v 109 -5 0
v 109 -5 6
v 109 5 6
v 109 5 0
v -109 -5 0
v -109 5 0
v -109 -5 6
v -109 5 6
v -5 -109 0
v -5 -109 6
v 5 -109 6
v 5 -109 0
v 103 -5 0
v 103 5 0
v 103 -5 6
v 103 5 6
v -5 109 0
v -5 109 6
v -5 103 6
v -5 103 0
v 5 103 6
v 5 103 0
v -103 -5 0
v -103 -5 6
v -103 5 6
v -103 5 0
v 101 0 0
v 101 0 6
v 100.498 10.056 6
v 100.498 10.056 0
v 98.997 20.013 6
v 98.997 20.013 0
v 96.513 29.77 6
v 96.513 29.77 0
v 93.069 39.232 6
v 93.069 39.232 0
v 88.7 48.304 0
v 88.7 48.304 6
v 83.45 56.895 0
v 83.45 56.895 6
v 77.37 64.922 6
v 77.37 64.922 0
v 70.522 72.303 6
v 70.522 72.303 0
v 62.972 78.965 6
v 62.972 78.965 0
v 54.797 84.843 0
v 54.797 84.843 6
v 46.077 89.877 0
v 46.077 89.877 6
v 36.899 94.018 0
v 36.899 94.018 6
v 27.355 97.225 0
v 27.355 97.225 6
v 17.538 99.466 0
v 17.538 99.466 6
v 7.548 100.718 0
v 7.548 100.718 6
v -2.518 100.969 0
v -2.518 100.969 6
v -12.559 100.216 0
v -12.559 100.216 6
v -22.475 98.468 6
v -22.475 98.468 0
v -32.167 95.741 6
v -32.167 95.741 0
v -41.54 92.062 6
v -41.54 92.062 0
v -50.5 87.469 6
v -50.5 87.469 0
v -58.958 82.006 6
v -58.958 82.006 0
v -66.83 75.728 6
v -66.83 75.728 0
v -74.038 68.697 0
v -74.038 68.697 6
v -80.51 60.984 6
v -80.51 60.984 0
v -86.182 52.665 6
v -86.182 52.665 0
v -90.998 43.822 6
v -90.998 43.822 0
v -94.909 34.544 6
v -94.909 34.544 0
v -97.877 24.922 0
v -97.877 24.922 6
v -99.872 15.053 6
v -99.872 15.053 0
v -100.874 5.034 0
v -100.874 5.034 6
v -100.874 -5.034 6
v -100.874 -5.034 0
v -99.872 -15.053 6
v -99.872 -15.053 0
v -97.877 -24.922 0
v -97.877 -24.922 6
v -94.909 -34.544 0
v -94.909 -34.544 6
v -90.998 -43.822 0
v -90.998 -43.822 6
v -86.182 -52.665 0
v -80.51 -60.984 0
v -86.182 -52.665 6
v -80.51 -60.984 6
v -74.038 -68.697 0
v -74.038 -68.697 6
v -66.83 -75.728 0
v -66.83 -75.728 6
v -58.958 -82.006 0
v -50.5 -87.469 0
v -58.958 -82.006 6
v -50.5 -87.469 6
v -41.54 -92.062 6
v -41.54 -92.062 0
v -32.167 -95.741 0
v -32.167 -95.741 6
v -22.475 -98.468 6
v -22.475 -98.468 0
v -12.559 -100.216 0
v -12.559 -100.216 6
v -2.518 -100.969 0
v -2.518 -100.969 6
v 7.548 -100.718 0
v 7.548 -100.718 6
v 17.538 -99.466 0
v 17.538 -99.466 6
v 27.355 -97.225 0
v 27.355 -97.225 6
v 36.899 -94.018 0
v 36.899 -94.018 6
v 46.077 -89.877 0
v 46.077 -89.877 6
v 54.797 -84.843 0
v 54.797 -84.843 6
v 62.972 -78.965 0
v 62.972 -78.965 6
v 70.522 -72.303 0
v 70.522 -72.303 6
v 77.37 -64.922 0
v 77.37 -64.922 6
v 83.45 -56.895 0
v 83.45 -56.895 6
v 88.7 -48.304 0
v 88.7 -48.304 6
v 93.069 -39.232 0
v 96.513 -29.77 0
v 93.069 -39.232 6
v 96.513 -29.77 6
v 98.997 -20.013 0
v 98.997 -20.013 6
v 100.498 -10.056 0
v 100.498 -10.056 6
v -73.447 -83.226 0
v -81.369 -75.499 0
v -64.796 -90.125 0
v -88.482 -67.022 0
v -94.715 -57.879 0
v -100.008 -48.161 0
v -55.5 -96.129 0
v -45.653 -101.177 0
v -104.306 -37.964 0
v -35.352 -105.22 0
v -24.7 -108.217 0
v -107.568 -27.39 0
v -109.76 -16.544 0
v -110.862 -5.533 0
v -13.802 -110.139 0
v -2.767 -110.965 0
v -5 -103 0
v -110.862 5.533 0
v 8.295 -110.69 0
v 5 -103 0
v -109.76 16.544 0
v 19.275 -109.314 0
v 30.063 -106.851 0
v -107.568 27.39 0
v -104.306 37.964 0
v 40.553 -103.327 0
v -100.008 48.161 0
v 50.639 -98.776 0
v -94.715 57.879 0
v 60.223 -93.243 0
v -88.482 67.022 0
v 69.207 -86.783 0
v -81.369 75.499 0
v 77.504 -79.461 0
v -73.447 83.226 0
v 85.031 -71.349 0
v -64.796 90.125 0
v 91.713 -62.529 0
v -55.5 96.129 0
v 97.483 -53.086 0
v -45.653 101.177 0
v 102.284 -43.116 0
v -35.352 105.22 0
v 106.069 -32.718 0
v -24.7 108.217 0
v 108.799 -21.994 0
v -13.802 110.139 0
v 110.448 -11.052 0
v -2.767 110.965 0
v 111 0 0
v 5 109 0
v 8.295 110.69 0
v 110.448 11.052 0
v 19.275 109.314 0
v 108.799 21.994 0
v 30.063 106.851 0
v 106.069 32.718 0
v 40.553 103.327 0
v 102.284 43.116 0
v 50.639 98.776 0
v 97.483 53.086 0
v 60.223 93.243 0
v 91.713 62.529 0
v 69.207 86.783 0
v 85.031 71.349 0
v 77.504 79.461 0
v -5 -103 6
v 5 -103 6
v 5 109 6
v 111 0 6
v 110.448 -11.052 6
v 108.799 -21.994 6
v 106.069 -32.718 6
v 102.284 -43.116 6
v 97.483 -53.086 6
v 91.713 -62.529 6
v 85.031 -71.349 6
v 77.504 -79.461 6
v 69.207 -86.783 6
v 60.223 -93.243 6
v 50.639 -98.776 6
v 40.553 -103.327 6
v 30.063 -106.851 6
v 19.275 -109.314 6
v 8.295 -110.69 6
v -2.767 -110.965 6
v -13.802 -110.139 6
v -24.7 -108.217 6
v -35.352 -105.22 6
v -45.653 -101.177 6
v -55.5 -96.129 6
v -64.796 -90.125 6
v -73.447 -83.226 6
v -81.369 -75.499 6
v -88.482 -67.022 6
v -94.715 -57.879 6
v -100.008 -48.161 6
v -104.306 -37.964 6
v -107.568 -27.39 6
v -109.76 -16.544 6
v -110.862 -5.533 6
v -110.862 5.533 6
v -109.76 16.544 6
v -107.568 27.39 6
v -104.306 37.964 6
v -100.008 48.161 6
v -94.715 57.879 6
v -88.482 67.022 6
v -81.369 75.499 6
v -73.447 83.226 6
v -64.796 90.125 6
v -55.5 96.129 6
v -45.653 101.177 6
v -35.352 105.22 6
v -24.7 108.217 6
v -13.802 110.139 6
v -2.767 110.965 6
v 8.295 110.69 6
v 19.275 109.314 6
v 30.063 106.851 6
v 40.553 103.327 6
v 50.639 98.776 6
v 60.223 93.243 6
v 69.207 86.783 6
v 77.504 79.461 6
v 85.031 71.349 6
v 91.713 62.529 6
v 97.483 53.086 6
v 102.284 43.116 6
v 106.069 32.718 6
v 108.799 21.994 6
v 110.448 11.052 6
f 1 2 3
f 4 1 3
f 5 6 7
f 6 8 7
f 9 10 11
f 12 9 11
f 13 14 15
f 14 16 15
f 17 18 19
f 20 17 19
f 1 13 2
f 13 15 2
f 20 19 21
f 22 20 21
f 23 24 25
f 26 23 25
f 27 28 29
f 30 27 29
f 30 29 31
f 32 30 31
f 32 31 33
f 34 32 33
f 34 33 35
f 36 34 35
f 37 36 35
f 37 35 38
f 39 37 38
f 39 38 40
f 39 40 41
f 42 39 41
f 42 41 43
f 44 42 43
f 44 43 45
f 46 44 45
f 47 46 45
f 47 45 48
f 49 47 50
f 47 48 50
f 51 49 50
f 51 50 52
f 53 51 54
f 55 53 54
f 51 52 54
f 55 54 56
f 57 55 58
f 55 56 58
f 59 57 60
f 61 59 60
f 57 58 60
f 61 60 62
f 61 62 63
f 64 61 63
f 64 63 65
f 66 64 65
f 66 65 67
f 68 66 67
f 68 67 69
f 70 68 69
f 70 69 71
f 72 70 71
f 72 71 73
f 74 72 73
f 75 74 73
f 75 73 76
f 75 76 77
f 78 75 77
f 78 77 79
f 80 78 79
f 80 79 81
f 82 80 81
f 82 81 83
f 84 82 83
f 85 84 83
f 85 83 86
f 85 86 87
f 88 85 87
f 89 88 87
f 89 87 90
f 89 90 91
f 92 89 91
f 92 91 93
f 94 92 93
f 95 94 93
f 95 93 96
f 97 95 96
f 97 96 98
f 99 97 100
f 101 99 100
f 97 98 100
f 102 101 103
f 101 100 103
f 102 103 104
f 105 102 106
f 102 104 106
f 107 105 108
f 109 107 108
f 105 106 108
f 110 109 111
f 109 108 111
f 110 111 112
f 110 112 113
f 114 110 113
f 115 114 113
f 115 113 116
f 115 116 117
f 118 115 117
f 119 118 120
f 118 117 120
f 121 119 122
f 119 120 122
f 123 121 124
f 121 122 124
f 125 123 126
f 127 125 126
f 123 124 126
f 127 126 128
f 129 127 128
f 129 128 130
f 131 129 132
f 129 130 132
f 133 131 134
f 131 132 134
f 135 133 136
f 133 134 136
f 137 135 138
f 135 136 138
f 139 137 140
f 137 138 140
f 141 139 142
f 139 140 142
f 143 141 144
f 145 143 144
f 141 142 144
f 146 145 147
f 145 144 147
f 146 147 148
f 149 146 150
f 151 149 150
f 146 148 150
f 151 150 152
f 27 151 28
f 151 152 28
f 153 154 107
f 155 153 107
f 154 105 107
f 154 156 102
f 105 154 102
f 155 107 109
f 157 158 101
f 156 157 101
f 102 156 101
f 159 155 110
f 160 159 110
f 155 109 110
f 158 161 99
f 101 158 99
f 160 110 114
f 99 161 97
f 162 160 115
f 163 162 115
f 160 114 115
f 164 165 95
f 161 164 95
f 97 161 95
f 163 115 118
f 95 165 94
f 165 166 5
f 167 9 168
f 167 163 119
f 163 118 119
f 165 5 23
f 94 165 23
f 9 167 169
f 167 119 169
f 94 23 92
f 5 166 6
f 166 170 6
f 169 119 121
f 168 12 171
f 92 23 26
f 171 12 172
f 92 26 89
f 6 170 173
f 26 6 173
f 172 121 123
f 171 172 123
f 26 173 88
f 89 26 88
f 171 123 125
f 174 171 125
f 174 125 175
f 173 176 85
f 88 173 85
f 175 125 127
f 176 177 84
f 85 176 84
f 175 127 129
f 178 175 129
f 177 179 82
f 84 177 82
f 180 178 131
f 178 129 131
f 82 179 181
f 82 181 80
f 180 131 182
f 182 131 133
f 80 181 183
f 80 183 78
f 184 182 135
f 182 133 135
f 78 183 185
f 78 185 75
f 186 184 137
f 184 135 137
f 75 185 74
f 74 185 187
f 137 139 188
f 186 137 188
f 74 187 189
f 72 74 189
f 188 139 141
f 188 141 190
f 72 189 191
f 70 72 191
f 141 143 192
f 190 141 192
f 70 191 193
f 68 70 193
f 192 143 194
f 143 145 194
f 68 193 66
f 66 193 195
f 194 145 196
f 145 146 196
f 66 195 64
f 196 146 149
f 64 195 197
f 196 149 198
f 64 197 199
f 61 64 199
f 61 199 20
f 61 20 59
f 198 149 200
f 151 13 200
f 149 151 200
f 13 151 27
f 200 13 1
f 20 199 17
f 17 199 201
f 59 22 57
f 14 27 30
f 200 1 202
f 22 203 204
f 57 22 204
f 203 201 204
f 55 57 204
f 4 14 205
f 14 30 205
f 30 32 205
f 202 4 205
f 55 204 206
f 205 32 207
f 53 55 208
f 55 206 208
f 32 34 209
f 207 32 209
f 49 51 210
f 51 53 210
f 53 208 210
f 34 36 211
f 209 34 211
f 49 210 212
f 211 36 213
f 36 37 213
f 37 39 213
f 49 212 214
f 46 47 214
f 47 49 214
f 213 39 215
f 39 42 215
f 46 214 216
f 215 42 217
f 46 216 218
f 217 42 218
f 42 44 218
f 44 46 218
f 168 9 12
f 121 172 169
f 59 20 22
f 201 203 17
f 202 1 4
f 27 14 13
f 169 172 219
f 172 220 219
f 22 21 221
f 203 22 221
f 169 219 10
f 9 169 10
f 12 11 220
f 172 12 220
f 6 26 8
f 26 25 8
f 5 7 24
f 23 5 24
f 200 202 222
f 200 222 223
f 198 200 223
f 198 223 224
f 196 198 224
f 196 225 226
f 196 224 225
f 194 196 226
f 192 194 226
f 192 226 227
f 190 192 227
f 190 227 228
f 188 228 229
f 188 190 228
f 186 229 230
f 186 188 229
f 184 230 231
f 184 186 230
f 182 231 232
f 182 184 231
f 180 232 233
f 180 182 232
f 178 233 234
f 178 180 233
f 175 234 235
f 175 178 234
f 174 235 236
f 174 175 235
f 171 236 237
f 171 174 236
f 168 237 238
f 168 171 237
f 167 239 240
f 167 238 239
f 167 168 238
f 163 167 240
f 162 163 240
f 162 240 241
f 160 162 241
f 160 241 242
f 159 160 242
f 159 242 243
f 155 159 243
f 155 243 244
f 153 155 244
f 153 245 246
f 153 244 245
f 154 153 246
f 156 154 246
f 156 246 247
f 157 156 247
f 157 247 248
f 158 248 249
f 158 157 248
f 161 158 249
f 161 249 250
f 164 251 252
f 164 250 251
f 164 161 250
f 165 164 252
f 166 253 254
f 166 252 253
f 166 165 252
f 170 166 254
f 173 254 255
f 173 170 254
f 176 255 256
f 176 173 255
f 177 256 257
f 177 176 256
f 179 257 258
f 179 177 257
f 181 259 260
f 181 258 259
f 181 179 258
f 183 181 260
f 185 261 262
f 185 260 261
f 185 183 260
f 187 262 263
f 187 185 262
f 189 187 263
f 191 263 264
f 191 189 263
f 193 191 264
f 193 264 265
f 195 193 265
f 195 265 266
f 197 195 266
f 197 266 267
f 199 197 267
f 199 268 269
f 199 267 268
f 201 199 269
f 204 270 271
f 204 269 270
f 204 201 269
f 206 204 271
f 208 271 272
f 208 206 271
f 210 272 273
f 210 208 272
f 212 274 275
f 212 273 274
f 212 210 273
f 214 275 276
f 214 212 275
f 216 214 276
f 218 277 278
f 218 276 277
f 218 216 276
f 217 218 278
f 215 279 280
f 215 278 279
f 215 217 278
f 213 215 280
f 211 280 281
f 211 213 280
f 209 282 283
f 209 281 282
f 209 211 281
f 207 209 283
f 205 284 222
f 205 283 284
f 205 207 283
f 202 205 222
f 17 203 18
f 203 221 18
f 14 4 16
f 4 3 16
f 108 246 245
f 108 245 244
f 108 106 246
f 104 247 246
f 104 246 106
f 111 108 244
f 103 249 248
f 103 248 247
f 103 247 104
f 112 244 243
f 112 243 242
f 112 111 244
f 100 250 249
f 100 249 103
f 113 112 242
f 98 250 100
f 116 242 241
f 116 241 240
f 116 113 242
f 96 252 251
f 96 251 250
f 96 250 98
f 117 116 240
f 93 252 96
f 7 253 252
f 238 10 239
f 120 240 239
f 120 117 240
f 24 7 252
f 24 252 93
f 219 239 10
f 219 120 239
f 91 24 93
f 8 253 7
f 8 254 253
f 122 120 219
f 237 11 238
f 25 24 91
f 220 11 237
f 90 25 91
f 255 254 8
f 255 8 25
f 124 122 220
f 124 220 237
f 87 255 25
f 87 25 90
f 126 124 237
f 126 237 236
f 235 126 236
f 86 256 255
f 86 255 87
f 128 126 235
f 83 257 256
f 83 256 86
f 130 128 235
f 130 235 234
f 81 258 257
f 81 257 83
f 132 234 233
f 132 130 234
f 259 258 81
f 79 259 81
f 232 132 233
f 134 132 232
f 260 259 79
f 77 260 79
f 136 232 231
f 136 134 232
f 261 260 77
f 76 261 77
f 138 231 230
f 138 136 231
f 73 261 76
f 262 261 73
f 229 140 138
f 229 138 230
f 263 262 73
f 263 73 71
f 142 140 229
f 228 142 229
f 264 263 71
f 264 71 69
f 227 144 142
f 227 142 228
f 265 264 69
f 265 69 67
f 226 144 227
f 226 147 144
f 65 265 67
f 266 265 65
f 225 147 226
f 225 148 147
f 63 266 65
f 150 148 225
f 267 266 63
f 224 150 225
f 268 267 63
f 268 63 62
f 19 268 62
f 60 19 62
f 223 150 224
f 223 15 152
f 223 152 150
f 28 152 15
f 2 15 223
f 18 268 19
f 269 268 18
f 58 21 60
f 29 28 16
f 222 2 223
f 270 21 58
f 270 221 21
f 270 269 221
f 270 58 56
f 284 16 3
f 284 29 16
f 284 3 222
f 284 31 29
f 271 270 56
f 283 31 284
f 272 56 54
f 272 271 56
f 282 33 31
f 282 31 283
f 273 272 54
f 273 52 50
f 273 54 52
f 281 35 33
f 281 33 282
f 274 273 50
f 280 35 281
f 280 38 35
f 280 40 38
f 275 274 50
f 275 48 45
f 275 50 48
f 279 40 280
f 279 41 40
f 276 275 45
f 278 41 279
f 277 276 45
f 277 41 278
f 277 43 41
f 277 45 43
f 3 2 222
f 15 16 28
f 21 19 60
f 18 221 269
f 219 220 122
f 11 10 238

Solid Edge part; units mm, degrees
sketch "Sketch1" plane through (0, 0, 0) normal (0, 0, 1) x (1, 0, 0)
  circle A0 centre (0, 0) radius 111
  dimension "D1" = 222
extrude "Protrusion1" add sketch "Sketch1" along normal blind 6
sketch "Sketch2" plane through (0, 0, 6) normal (0, 0, 1) x (1, 0, 0)
  circle A0 centre (0, 0) radius 101
extrude "Cutout1" cut sketch "Sketch2" against normal through all
sketch "Sketch3" plane through (0, 0, 6) normal (0, 0, 1) x (1, 0, 0)
  line L0 (-5, 103) -> (5, 103)
  line L1 (5, 103) -> (5, 109)
  line L2 (5, 109) -> (-5, 109)
  line L3 (-5, 109) -> (-5, 103)
  dimension "D1" = 10
  dimension "D2" = 6
  dimension "D3" = 103
extrude "Cutout2" cut sketch "Sketch3" against normal through all
pattern_circular "Pattern1" count 4 over 360 about axis through (0, 0, 6) along (0, 0, -1) of "Cutout2"
properties material "Wood, Mahogany"
